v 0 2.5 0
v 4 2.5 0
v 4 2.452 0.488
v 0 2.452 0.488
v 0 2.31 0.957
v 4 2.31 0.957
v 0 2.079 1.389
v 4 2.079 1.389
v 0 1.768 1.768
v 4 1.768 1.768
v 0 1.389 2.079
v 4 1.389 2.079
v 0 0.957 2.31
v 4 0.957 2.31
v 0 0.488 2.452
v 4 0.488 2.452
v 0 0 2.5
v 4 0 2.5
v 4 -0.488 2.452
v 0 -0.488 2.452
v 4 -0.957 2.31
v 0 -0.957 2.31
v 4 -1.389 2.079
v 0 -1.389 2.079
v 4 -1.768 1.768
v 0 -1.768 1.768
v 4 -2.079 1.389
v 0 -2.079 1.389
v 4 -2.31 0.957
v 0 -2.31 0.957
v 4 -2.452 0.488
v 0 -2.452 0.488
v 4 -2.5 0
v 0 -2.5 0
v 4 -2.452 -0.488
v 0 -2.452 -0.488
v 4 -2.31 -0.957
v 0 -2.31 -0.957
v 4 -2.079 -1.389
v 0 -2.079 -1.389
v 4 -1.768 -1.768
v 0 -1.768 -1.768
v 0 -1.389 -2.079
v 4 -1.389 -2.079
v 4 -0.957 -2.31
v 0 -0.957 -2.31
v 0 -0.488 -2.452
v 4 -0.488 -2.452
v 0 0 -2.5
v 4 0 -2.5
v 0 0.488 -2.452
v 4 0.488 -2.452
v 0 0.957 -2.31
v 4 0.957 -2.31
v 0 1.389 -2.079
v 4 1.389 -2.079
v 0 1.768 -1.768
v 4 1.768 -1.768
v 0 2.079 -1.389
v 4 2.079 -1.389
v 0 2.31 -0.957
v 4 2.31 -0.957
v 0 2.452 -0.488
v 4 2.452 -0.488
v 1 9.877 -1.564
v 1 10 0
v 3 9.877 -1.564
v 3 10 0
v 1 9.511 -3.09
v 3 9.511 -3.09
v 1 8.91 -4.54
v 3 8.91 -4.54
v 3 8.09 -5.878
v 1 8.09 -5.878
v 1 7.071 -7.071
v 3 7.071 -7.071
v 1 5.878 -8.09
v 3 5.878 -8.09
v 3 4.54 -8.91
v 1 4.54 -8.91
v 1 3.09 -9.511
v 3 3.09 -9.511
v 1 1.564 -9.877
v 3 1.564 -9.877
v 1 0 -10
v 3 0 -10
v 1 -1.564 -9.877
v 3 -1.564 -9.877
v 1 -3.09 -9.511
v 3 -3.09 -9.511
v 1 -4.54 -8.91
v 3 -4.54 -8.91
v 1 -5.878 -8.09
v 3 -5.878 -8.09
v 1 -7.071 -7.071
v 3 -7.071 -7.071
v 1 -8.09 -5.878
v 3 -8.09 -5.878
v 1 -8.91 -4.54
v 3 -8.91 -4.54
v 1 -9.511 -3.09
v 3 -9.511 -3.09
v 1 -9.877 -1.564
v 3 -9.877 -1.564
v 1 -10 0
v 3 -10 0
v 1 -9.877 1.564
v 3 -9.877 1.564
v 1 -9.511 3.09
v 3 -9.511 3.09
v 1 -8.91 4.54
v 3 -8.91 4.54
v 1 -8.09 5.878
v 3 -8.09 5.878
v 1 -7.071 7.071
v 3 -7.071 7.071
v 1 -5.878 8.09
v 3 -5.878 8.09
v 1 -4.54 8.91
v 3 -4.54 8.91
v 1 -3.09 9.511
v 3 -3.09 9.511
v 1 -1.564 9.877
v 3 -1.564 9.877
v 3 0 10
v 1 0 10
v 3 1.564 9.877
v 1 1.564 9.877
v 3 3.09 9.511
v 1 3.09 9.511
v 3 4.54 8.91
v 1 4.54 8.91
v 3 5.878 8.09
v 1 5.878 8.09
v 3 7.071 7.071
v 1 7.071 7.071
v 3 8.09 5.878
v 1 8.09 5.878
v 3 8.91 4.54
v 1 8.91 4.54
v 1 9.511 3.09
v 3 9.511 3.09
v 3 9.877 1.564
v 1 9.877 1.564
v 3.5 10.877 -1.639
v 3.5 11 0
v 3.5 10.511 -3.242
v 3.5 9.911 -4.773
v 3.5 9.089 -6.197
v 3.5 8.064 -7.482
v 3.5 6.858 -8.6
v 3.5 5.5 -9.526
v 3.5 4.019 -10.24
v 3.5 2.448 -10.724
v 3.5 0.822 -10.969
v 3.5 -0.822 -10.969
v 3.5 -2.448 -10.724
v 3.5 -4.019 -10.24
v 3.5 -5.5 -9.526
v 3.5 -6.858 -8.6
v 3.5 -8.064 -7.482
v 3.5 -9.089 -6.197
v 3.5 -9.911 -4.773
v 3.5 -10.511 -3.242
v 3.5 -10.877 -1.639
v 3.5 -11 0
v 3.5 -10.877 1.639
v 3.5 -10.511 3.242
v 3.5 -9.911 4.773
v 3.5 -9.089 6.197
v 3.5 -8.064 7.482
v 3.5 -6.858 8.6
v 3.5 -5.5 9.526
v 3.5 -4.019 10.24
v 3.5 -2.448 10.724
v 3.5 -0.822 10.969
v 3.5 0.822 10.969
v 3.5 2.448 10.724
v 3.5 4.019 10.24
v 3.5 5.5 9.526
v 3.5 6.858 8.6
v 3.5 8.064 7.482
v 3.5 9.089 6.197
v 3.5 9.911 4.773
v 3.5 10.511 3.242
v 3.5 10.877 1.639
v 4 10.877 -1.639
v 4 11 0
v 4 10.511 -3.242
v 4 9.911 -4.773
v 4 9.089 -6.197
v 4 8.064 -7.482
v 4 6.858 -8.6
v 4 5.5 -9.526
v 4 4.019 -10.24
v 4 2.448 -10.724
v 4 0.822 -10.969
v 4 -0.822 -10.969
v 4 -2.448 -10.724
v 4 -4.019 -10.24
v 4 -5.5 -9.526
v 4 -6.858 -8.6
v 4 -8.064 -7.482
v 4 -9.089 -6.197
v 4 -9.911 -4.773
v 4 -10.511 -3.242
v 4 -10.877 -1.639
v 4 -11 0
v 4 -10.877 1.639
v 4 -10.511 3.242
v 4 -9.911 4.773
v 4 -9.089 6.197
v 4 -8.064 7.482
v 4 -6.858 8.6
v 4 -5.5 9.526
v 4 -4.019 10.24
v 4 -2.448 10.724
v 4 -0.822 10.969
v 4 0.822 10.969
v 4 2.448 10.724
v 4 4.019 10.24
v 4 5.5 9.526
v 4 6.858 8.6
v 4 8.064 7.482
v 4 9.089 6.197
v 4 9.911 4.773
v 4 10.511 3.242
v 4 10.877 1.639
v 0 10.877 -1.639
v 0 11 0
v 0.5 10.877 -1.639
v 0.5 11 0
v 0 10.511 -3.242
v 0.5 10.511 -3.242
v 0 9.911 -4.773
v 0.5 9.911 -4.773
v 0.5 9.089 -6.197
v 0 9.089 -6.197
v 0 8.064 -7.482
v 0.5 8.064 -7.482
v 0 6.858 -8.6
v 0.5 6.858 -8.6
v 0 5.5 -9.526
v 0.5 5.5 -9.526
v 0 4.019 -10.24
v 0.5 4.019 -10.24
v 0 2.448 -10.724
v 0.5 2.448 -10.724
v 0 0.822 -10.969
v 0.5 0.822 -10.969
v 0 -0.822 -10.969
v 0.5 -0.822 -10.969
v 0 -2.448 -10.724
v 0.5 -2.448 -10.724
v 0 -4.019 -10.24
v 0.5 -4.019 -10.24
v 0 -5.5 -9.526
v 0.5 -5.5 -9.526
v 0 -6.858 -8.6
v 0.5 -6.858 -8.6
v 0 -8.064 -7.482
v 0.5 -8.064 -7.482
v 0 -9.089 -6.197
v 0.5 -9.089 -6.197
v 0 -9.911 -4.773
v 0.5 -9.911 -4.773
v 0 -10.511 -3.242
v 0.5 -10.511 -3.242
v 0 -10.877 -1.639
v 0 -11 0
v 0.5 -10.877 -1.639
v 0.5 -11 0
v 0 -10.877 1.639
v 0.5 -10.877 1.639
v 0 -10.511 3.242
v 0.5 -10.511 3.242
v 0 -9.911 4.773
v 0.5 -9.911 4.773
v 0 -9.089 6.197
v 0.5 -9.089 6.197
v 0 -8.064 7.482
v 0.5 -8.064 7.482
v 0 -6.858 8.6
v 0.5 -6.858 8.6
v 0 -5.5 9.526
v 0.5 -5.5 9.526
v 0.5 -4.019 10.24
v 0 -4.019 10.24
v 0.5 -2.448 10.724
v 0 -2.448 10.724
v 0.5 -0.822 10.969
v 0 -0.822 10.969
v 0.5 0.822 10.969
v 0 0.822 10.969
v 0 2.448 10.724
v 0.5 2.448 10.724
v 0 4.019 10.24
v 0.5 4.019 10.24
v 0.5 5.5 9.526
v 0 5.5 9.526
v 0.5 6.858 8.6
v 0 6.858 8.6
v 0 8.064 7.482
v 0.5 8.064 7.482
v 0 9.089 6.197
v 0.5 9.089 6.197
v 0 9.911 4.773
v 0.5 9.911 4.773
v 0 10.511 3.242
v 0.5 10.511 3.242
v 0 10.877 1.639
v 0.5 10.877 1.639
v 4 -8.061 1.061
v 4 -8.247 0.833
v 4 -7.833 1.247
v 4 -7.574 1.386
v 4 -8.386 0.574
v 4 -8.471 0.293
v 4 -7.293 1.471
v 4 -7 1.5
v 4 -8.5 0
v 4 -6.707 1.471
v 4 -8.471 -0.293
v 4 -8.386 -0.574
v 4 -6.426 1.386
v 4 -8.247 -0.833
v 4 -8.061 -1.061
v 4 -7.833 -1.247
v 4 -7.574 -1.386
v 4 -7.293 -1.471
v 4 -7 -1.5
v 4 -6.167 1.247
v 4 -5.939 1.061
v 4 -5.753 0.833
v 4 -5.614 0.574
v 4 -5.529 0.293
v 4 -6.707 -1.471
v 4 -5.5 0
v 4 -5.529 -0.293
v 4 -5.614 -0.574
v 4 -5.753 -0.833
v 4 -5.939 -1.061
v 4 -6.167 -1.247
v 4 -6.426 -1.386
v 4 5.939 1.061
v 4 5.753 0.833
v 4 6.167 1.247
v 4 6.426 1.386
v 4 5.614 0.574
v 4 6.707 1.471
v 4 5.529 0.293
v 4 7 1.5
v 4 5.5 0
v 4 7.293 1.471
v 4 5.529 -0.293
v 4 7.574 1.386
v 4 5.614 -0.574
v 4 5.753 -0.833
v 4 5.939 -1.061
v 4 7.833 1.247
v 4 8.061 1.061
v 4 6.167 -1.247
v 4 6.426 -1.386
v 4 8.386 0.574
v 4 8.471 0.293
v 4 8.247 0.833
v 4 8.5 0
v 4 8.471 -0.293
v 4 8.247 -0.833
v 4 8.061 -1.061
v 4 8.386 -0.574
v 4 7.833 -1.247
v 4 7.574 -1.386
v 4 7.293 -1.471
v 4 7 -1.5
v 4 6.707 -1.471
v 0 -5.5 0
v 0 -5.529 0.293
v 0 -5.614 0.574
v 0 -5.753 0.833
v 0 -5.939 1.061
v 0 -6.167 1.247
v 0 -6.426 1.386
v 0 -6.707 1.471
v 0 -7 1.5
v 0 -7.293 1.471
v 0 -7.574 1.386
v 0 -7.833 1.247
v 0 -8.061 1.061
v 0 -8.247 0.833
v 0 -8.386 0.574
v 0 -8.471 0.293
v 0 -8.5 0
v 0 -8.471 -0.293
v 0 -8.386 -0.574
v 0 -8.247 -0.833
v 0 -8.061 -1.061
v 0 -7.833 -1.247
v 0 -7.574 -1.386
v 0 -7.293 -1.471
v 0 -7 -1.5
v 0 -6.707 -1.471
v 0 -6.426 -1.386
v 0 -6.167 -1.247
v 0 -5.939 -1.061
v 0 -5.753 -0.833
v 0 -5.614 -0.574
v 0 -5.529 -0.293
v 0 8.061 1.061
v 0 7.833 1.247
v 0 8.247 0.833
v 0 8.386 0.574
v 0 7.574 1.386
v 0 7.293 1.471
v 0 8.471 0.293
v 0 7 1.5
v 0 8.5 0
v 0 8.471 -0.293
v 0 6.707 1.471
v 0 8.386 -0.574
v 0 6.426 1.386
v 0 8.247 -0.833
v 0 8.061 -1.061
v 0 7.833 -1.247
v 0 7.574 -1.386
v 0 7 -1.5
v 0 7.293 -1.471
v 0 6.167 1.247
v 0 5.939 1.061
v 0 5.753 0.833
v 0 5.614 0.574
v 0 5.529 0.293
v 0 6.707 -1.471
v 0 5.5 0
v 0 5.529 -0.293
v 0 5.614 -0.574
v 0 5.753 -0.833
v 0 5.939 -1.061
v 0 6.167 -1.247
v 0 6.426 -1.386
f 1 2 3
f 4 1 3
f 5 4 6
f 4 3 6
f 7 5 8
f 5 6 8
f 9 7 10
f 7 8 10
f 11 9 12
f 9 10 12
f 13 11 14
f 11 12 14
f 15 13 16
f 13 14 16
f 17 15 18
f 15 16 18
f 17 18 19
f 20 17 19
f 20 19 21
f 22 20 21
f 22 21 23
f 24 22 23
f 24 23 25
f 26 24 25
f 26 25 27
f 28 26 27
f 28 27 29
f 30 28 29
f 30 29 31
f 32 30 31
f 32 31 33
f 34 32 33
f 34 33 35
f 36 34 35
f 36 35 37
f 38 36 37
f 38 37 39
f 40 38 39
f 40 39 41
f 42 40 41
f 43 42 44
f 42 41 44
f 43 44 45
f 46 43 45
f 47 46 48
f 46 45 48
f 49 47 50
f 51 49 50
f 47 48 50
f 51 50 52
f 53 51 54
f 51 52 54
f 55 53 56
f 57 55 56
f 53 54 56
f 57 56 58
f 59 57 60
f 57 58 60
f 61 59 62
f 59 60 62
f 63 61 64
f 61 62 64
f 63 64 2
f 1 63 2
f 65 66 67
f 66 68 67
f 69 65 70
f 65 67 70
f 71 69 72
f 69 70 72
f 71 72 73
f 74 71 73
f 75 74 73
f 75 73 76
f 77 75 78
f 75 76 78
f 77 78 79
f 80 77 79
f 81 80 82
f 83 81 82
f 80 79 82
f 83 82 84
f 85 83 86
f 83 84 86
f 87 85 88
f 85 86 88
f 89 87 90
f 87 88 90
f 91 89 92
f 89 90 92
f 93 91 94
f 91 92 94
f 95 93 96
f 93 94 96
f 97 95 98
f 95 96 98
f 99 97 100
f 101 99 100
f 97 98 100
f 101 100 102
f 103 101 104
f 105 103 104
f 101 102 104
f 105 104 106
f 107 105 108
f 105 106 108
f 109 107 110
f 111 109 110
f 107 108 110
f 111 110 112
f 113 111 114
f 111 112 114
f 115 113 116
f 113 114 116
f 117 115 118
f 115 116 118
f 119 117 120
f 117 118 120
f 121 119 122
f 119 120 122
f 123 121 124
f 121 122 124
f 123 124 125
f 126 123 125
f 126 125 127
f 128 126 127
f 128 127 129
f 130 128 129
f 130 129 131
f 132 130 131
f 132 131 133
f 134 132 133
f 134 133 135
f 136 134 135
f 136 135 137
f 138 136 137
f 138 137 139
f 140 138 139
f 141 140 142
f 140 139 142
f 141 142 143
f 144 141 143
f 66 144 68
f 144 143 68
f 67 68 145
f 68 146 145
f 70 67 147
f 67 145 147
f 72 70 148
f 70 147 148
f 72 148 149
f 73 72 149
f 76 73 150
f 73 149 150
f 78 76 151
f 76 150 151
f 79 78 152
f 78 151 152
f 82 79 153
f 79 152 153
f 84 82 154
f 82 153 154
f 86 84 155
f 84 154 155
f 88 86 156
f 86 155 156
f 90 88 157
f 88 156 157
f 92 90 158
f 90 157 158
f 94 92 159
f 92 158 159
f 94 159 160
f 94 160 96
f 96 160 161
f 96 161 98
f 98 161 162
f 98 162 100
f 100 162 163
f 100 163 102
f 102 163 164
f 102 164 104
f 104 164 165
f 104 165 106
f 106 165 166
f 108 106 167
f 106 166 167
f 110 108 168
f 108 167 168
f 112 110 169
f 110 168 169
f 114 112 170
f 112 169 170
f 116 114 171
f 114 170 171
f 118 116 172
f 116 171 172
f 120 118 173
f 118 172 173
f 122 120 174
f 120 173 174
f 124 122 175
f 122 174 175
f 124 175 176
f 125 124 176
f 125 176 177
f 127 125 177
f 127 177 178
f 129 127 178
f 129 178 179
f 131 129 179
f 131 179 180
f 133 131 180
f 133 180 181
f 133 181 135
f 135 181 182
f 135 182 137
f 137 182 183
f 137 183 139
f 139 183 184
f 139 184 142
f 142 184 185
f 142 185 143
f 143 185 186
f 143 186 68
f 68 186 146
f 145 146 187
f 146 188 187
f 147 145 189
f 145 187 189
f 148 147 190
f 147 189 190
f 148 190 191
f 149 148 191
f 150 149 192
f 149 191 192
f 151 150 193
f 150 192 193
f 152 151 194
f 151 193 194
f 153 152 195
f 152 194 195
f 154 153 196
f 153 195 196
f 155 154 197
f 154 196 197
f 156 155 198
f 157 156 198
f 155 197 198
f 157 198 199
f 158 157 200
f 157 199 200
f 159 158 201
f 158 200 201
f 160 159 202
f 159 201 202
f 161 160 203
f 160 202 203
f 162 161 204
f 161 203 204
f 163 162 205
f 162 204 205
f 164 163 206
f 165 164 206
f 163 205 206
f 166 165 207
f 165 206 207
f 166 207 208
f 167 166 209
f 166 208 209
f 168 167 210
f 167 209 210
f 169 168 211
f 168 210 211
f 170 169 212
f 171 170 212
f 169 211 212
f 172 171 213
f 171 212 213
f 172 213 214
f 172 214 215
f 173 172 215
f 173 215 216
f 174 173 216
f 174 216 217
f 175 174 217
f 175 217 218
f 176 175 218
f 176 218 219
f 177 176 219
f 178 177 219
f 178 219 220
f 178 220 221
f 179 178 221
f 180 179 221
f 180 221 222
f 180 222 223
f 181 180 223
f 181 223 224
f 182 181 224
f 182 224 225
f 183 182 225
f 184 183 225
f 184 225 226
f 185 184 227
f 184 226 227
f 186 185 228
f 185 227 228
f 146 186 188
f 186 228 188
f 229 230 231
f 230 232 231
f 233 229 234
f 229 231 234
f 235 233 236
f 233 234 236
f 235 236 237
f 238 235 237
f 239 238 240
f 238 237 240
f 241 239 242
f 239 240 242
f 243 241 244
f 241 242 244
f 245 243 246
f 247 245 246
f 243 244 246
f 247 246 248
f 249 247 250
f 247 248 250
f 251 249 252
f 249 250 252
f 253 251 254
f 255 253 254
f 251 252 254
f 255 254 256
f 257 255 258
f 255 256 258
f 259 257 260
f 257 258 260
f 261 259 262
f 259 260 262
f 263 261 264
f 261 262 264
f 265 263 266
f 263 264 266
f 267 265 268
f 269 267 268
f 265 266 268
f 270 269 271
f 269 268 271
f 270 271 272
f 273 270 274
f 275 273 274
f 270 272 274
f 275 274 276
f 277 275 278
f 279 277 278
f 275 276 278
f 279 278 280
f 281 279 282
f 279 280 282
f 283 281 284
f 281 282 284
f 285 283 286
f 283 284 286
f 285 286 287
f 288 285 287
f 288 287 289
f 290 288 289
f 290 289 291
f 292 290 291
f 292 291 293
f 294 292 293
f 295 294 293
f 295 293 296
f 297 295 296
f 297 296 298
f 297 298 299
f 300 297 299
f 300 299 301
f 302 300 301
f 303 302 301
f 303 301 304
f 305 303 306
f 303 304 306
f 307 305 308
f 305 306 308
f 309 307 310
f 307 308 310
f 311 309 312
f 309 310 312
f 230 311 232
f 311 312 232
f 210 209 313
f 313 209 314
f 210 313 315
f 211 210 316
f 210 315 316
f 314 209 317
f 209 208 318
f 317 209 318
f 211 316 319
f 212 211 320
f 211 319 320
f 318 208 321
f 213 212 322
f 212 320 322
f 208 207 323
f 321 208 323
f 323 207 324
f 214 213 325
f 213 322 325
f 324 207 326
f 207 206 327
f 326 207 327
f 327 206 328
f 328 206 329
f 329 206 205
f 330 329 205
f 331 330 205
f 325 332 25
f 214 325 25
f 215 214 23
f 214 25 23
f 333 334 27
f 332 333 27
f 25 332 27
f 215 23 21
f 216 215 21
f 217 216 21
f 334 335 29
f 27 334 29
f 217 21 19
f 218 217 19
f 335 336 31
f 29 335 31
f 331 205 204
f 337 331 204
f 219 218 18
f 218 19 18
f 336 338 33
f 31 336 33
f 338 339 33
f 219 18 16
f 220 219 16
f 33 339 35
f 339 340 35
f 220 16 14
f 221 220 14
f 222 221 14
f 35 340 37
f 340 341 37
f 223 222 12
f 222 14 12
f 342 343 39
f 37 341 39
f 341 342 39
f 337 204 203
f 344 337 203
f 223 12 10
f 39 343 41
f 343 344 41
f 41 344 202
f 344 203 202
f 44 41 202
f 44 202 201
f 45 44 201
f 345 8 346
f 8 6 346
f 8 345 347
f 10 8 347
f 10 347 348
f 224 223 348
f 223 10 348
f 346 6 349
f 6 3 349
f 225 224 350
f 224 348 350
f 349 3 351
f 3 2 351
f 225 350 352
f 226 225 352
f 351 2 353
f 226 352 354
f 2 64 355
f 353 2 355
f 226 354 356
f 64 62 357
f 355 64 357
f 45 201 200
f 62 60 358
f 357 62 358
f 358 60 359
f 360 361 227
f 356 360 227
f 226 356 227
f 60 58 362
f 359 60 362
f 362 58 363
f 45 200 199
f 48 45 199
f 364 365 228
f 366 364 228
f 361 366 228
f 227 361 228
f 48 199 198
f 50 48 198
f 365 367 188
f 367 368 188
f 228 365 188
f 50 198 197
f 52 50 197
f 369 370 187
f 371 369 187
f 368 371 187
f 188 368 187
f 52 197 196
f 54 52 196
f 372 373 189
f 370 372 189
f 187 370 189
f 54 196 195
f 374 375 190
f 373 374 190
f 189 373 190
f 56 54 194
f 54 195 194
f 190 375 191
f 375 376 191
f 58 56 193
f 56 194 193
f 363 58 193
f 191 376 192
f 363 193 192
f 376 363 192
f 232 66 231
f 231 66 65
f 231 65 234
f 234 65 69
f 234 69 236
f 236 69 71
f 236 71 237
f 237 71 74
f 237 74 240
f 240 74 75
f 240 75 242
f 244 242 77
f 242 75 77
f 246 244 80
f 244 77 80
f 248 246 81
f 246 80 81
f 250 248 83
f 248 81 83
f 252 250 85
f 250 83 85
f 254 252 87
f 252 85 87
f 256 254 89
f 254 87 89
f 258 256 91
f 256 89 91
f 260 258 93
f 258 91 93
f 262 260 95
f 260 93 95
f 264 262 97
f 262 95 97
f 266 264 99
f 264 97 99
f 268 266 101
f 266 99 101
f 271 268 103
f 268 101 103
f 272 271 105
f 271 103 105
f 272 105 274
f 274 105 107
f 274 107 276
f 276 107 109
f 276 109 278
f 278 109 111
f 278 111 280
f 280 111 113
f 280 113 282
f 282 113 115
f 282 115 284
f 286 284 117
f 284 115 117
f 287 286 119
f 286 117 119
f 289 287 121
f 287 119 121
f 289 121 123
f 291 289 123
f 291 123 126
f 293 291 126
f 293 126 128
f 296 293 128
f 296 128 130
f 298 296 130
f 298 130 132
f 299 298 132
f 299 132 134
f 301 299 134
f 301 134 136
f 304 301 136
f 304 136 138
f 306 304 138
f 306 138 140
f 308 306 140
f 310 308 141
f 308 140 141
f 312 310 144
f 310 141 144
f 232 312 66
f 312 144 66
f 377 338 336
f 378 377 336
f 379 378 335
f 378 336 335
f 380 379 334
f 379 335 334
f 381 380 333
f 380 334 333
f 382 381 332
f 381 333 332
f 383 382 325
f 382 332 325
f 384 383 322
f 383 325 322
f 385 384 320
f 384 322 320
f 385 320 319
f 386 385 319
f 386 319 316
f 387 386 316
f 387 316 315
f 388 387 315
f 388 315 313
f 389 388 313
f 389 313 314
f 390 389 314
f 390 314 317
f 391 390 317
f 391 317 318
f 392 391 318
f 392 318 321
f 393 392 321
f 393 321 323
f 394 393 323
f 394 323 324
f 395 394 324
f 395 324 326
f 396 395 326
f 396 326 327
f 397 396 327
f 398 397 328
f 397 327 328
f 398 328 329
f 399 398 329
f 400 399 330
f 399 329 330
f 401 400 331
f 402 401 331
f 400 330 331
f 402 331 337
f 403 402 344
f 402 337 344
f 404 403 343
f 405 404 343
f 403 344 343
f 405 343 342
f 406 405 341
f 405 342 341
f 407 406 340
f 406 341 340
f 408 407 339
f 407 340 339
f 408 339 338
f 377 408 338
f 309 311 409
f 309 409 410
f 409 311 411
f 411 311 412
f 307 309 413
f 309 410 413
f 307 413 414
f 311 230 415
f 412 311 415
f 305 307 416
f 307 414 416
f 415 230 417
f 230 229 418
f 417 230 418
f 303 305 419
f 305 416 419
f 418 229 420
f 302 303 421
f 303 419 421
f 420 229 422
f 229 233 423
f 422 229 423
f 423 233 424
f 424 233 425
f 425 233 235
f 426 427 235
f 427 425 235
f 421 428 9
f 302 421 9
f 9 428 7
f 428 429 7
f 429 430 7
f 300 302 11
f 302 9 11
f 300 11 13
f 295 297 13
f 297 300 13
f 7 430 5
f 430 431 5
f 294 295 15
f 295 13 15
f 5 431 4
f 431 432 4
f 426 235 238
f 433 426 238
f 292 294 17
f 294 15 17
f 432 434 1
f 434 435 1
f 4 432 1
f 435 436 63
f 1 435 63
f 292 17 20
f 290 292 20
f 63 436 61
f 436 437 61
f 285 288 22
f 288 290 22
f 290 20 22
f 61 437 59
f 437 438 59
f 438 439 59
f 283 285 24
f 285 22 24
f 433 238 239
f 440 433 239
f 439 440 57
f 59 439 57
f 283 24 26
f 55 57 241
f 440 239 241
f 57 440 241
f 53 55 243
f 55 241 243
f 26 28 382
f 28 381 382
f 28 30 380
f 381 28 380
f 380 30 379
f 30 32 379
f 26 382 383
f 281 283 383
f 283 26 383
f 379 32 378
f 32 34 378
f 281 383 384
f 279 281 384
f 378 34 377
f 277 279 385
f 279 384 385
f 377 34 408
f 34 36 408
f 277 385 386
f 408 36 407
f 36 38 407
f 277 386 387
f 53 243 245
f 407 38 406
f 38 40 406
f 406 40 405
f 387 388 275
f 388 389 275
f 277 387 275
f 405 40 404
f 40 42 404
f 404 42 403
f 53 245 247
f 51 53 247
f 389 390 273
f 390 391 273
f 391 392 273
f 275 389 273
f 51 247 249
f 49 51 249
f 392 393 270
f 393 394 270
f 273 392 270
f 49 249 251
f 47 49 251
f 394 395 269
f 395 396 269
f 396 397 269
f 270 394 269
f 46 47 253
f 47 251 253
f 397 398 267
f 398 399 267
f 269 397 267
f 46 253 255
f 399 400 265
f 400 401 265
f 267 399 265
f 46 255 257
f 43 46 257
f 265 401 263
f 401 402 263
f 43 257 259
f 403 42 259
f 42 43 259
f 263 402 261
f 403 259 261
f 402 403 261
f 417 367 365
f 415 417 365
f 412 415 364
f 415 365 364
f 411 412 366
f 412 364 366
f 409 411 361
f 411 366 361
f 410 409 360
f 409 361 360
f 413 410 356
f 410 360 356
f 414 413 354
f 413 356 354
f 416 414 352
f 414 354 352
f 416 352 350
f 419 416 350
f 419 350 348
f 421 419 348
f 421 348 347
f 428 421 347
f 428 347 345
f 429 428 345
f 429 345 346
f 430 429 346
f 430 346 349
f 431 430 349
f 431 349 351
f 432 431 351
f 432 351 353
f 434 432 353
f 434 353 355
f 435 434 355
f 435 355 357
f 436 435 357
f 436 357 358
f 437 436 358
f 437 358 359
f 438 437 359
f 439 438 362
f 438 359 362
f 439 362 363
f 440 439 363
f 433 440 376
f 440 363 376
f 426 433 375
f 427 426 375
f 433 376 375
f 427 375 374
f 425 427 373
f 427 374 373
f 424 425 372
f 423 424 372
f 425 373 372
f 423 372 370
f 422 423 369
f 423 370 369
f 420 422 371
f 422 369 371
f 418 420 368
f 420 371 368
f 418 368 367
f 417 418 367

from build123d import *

# Parameters (mm, degrees)
ESQUISSE2_R             = 2.5
ESQUISSE2_R_2           = 1.5
ENL_V_MAT_EXTRU_1_DEPTH = 10


with BuildPart() as part:
    # Esquisse1 → Révolution1 (revolve)
    with BuildSketch(Plane.XY):
        Polygon((0, 0), (0, 11), (0.5, 11), (1, 10), (3, 10), (3.5, 11), (4, 11), (4, 0), align=None)
    revolve(axis=Axis((4, 0, 0), (-1, 0, 0)))

    # Esquisse2 → Enlèv. mat.-Extru.1 (cut)
    with BuildSketch(Plane(origin=(4, 0, 0), x_dir=(0, 0, -1), z_dir=(1, 0, 0))):
        with Locations(Location((0, 0, 0), (0, 0, 90))):
            Circle(ESQUISSE2_R)
        with Locations(Location((0, 7, 0), (0, 0, 90))):
            Circle(ESQUISSE2_R_2)
        with Locations(Location((0, -7, 0), (0, 0, 90))):
            Circle(ESQUISSE2_R_2)
    extrude(amount=-ENL_V_MAT_EXTRU_1_DEPTH, mode=Mode.SUBTRACT)


solid = part.part
